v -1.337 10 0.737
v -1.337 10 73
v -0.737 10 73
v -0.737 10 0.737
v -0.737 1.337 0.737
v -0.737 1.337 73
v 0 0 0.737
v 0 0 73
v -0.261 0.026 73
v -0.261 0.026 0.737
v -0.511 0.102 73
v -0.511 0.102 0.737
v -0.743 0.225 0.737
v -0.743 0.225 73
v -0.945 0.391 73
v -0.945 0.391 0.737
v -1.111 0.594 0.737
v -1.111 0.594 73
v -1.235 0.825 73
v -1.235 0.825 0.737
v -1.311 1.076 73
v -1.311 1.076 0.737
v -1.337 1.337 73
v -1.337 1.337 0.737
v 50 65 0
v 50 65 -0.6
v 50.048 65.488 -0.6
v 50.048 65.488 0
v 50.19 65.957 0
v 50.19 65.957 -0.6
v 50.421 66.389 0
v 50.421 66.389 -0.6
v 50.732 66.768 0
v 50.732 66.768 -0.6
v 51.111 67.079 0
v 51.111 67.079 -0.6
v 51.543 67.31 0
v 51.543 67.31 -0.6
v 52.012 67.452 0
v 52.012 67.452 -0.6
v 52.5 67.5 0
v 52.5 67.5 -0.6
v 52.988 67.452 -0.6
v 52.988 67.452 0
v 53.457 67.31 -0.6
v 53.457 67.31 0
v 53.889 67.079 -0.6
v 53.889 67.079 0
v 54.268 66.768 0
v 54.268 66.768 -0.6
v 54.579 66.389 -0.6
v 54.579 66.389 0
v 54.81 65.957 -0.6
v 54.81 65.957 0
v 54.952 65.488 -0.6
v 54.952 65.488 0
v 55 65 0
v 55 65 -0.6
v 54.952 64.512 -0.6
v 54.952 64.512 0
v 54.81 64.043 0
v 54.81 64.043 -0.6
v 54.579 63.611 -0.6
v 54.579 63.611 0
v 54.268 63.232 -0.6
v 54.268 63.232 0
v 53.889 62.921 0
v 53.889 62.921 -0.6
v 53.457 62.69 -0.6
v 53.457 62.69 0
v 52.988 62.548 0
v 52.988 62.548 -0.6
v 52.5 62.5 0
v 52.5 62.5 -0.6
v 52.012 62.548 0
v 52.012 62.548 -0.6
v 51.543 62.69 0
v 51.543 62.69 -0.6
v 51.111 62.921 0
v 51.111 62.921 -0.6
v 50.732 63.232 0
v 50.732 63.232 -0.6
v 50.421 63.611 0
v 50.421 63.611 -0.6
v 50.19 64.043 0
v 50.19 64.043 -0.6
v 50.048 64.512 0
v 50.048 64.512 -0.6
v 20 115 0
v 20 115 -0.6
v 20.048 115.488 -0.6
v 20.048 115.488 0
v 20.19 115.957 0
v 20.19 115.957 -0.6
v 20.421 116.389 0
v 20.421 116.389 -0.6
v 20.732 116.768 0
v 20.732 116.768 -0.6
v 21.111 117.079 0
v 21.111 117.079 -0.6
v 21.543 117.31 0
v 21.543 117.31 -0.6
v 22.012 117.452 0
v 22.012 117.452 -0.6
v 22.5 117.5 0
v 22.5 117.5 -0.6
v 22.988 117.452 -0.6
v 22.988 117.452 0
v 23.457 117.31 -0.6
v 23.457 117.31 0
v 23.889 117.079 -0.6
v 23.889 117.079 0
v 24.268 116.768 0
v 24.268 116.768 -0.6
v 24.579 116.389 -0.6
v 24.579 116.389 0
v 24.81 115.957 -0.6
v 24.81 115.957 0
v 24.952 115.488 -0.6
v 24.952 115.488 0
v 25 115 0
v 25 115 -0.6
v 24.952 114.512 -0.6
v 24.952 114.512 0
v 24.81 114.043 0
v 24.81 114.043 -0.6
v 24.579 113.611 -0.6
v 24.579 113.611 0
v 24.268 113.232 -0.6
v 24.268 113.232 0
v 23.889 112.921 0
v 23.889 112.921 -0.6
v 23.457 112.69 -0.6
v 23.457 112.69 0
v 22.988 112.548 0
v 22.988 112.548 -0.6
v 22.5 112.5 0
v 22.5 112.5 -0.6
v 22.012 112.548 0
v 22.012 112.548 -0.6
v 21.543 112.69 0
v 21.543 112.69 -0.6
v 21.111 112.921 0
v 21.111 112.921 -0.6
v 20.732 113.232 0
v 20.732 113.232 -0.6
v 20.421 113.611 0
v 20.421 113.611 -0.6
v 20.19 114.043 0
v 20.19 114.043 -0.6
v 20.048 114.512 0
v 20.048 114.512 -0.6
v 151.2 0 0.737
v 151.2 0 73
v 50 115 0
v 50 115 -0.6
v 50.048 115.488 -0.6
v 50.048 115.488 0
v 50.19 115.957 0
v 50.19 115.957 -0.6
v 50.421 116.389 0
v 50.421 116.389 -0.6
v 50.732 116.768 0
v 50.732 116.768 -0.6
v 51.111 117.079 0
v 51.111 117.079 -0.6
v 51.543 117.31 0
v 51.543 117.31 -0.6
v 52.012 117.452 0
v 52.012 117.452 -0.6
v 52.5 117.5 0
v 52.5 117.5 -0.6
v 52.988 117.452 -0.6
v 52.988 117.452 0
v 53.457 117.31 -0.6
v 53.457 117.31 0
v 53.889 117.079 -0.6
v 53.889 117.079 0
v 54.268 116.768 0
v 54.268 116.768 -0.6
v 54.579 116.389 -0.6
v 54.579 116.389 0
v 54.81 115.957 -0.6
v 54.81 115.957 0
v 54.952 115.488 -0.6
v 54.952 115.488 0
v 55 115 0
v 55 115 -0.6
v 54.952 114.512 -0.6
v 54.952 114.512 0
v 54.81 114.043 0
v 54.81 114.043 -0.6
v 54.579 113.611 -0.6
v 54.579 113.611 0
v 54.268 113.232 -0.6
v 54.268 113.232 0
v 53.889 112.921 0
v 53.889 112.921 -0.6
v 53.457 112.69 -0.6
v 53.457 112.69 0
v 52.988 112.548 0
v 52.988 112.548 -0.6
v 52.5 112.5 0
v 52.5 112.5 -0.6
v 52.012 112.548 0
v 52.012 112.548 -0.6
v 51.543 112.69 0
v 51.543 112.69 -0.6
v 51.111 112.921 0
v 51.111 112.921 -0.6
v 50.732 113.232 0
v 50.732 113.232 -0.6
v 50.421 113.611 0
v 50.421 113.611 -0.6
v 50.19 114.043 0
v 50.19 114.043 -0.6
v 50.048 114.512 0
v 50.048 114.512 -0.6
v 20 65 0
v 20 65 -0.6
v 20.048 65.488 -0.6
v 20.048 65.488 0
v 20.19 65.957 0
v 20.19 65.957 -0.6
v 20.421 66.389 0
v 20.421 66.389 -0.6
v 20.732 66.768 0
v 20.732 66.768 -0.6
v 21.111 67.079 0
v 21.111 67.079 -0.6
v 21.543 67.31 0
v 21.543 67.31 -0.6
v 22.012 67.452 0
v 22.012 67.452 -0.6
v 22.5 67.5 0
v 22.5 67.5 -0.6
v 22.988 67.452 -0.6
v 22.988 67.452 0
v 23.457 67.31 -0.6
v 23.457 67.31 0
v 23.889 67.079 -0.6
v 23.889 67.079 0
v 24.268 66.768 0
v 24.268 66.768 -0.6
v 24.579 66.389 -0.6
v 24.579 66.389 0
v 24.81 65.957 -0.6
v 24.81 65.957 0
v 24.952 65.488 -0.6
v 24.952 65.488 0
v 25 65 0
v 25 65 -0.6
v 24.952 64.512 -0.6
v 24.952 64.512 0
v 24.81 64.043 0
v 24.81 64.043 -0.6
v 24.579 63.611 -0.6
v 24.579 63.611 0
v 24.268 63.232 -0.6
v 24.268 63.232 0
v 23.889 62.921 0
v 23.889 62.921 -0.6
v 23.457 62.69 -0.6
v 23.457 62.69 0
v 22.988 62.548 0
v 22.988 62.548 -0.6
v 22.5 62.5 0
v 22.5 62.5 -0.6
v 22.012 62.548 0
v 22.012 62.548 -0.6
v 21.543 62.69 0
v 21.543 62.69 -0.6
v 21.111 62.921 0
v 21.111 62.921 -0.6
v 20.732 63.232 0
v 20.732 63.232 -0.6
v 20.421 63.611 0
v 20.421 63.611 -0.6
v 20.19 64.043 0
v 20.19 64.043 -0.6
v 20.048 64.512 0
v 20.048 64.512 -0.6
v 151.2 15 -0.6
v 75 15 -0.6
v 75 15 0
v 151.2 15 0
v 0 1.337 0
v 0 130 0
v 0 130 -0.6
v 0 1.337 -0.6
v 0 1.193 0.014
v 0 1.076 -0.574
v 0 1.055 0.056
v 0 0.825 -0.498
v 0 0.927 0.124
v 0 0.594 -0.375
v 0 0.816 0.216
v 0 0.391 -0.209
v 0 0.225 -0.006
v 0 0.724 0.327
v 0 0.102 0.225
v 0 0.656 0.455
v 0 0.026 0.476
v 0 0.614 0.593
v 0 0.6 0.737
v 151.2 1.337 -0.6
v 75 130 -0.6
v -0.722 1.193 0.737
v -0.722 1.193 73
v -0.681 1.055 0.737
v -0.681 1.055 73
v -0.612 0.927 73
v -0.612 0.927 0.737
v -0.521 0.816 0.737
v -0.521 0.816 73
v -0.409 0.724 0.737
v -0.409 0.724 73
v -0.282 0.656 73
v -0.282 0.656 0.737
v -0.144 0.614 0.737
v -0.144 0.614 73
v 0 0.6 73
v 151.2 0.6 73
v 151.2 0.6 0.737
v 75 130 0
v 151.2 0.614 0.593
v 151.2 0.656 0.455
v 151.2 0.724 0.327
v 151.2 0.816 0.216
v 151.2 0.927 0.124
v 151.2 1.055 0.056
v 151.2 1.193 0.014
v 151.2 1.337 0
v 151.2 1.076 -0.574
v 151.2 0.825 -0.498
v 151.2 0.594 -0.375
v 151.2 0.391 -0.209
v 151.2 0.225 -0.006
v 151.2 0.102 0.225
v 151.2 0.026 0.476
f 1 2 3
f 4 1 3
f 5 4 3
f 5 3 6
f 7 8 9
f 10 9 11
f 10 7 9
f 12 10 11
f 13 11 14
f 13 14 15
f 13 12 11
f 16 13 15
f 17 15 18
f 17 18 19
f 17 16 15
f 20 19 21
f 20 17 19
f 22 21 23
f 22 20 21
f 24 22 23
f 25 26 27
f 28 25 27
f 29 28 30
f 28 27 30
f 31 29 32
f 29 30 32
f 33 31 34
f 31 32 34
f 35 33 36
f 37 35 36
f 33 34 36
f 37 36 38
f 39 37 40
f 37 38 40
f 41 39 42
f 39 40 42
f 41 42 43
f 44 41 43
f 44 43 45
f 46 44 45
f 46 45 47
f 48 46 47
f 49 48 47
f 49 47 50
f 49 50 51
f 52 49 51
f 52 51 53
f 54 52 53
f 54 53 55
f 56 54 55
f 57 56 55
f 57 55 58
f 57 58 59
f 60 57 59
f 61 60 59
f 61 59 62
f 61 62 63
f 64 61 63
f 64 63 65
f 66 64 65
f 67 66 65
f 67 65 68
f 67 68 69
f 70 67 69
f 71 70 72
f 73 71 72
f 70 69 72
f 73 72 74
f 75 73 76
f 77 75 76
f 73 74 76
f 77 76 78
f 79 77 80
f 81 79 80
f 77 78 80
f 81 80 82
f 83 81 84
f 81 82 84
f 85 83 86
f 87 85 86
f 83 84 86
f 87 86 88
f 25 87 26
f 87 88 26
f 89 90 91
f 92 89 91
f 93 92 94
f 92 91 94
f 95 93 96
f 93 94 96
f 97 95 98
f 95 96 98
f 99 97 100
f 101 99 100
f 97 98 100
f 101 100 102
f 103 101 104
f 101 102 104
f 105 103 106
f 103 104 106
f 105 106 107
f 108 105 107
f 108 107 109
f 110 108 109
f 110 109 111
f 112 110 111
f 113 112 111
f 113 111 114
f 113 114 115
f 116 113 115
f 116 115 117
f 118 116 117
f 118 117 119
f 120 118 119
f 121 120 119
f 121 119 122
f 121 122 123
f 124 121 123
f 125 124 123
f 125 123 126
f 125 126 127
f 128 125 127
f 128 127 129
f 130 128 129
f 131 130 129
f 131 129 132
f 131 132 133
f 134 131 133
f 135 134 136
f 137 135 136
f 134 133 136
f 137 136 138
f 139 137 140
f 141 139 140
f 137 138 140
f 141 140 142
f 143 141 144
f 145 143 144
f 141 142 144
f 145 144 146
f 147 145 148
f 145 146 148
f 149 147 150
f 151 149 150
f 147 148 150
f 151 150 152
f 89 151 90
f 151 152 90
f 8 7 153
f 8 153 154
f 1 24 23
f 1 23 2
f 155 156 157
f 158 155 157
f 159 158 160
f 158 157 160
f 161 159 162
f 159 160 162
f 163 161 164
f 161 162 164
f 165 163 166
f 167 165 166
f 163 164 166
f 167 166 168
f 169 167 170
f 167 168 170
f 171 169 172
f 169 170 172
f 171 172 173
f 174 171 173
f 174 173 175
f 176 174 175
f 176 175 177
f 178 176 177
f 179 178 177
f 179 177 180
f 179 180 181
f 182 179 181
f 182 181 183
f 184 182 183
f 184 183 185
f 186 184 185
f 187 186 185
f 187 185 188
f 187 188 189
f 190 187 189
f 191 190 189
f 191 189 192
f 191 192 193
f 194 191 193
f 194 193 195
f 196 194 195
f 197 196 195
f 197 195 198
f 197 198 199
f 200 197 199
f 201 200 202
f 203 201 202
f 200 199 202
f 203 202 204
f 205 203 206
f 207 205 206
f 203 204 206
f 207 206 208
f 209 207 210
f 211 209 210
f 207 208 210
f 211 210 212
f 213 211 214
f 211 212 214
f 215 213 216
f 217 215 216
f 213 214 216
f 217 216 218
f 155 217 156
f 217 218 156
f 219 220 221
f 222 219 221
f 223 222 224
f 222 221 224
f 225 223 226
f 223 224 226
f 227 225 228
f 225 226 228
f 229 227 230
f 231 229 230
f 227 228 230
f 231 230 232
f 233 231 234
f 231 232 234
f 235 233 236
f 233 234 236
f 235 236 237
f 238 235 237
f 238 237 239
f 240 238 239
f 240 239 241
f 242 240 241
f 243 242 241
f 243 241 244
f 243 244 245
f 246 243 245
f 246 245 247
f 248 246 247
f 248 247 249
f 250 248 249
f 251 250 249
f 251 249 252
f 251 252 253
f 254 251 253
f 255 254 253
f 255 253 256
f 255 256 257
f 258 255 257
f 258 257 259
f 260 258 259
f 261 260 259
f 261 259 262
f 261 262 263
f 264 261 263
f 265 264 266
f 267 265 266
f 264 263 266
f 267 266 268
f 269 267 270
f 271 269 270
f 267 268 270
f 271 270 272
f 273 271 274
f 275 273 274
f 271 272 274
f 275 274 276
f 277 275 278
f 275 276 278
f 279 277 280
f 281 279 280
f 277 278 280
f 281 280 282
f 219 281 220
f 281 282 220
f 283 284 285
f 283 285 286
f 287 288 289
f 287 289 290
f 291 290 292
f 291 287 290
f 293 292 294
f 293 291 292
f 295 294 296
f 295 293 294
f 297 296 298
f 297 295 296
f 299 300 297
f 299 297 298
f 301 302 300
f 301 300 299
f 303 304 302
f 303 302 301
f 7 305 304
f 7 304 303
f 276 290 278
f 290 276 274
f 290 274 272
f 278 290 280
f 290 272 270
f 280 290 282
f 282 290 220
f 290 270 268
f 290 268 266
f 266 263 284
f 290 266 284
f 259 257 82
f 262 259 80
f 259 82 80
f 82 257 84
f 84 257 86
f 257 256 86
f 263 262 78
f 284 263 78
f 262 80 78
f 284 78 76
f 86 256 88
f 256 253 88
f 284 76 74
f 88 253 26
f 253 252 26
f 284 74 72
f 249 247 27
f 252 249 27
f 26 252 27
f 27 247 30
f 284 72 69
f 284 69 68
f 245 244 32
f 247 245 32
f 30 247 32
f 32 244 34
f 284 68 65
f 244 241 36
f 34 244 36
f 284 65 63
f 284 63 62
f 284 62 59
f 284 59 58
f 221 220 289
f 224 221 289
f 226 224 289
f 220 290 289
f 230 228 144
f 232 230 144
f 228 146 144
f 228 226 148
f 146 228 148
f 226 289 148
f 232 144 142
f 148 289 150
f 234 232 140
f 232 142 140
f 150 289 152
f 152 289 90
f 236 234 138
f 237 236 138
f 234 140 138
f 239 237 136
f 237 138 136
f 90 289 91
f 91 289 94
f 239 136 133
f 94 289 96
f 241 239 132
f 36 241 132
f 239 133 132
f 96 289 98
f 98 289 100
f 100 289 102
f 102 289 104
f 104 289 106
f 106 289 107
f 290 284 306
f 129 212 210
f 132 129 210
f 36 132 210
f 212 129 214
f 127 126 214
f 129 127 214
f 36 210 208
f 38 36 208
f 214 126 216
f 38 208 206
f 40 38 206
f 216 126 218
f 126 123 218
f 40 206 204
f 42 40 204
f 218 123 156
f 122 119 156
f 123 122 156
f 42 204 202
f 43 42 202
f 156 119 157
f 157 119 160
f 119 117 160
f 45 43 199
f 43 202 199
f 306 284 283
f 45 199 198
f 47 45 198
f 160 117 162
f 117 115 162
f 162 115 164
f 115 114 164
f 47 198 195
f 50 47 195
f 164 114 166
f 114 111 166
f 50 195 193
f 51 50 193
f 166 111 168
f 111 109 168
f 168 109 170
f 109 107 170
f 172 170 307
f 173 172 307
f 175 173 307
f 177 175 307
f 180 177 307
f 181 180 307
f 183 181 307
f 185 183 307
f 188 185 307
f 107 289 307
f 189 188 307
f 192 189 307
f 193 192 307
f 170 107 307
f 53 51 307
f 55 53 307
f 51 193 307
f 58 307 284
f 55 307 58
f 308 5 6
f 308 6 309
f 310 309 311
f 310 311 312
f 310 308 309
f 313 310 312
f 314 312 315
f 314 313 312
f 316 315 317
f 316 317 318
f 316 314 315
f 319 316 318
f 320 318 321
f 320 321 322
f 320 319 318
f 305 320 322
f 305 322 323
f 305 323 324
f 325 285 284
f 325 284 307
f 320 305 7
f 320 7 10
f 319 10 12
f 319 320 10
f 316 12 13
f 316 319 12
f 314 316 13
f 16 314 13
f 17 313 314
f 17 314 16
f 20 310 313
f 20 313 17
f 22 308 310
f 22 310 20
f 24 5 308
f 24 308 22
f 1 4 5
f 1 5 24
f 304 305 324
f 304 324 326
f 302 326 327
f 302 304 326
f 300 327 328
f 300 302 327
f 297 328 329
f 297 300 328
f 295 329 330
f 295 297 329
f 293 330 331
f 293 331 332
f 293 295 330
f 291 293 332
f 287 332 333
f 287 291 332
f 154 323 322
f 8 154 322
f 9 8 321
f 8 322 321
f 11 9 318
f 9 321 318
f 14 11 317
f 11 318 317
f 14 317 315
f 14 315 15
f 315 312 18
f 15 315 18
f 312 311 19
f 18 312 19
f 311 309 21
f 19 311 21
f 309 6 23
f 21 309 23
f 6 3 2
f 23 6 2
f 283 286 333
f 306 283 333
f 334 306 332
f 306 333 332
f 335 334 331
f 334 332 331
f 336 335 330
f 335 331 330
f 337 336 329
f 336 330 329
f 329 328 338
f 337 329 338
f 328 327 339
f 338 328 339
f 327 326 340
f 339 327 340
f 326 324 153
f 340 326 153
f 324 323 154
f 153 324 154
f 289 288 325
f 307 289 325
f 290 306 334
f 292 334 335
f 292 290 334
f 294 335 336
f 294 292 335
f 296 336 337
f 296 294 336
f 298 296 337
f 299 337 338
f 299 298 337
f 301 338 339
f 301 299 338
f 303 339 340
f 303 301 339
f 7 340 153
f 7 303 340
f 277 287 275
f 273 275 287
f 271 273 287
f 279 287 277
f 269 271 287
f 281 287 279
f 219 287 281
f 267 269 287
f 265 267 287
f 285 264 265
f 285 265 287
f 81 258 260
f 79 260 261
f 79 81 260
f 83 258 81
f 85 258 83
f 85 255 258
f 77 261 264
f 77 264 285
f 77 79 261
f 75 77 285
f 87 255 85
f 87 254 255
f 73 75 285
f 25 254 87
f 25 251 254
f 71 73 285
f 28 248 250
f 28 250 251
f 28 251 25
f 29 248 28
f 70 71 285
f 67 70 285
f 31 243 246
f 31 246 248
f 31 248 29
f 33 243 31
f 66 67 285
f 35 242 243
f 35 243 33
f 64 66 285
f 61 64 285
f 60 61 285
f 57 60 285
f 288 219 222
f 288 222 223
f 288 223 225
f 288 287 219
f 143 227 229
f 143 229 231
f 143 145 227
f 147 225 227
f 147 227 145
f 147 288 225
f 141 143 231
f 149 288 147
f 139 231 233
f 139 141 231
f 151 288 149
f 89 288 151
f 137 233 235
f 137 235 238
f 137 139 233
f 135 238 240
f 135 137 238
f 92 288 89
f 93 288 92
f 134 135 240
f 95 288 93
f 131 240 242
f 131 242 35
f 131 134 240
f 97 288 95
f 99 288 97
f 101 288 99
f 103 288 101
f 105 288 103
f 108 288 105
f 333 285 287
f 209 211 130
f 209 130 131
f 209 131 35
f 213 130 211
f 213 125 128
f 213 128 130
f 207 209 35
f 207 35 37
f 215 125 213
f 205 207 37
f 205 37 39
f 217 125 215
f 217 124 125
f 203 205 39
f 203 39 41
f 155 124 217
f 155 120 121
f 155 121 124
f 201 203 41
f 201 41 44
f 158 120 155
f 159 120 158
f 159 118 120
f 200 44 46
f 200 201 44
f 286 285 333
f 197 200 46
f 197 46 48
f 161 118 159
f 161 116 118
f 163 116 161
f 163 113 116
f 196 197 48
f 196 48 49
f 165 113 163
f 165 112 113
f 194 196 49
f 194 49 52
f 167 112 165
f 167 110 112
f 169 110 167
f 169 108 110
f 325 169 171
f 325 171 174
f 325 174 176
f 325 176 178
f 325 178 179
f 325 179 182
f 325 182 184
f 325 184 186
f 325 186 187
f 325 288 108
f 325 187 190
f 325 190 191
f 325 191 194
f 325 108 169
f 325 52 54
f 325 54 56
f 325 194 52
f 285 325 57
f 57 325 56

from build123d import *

# Parameters (mm, degrees)
SKETCH2_W                    = 75
SKETCH2_H                    = 130
BASE_FLANGE1_DEPTH           = 0.6
TAB2_START                   = -0.6
TAB2_OUTLINE_W               = 76.2
TAB2_OUTLINE_H               = 15
TAB2_DEPTH                   = 0.6
CUT_EXTRUDE1_REACH           = 201.404
SKETCH10_R                   = 2.5
EDGE_FLANGE1_STRIP_W         = 3.8732
EDGE_FLANGE1_STRIP_H         = 0.6
EDGE_FLANGE1_STRIP_CUT_DEPTH = 151.2
EDGE_FLANGE1_DEPTH           = 151.2
EDGE_FLANGE2_DEPTH           = 72.2634


# Read off the part's stored shape, not the designer's step: Tab2
# Sheet-metal steps are written as plain solids
with BuildPart() as part:
    # Sketch2 → Base-Flange1 (new body)
    with BuildSketch(Plane.XY):
        with Locations((37.5, 65)):
            Rectangle(SKETCH2_W, SKETCH2_H)
    extrude(amount=-BASE_FLANGE1_DEPTH)

    # Tab2 outline → Tab2 (add)
    with BuildSketch(Plane.XY.offset(TAB2_START)):
        with Locations((113.1, 7.5)):
            Rectangle(TAB2_OUTLINE_W, TAB2_OUTLINE_H)
    extrude(amount=TAB2_DEPTH)

    # Sketch10 → Cut-Extrude1 (cut, up to next)
    with BuildSketch(Plane(origin=(0, 0, -0.6), x_dir=(-1, 0, 0), z_dir=(0, 0, -1)), mode=Mode.PRIVATE) as cut_extrude1_sk1:
        with Locations((-22.5, 65)):
            Circle(SKETCH10_R)
    cut_extrude1_tool1 = extrude(cut_extrude1_sk1.sketch, amount=-CUT_EXTRUDE1_REACH, mode=Mode.PRIVATE) & part.part
    # Sketch10 → Cut-Extrude1 (cut, up to next)
    with BuildSketch(Plane(origin=(0, 0, -0.6), x_dir=(-1, 0, 0), z_dir=(0, 0, -1)), mode=Mode.PRIVATE) as cut_extrude1_sk2:
        with Locations((-52.5, 115)):
            Circle(SKETCH10_R)
    cut_extrude1_tool2 = extrude(cut_extrude1_sk2.sketch, amount=-CUT_EXTRUDE1_REACH, mode=Mode.PRIVATE) & part.part
    # Sketch10 → Cut-Extrude1 (cut, up to next)
    with BuildSketch(Plane(origin=(0, 0, -0.6), x_dir=(-1, 0, 0), z_dir=(0, 0, -1)), mode=Mode.PRIVATE) as cut_extrude1_sk3:
        with Locations((-52.5, 65)):
            Circle(SKETCH10_R)
    cut_extrude1_tool3 = extrude(cut_extrude1_sk3.sketch, amount=-CUT_EXTRUDE1_REACH, mode=Mode.PRIVATE) & part.part
    # Sketch10 → Cut-Extrude1 (cut, up to next)
    with BuildSketch(Plane(origin=(0, 0, -0.6), x_dir=(-1, 0, 0), z_dir=(0, 0, -1)), mode=Mode.PRIVATE) as cut_extrude1_sk4:
        with Locations((-22.5, 115)):
            Circle(SKETCH10_R)
    cut_extrude1_tool4 = extrude(cut_extrude1_sk4.sketch, amount=-CUT_EXTRUDE1_REACH, mode=Mode.PRIVATE) & part.part
    add(cut_extrude1_tool1.solids().sort_by_distance((22.5, 65, -0.6))[0], mode=Mode.SUBTRACT)
    add(cut_extrude1_tool2.solids().sort_by_distance((52.5, 115, -0.6))[0], mode=Mode.SUBTRACT)
    add(cut_extrude1_tool3.solids().sort_by_distance((52.5, 65, -0.6))[0], mode=Mode.SUBTRACT)
    add(cut_extrude1_tool4.solids().sort_by_distance((22.5, 115, -0.6))[0], mode=Mode.SUBTRACT)

    # Edge-Flange1 strip (across the edge) → Edge-Flange1 strip cut (cut)
    with BuildSketch(Plane.YZ):
        with Locations((-0.6, -0.3)):
            Rectangle(EDGE_FLANGE1_STRIP_W, EDGE_FLANGE1_STRIP_H)
    extrude(amount=EDGE_FLANGE1_STRIP_CUT_DEPTH, mode=Mode.SUBTRACT)

    # Edge-Flange1 section (across the edge) → Edge-Flange1 (add)
    with BuildSketch(Plane.YZ):
        with BuildLine():
            Line((0, 0.7366), (0, 73))
            Line((0, 73), (0.6, 73))
            Line((0.6, 73), (0.6, 0.7366))
            ThreePointArc((0.6, 0.7366), (0.815745145, 0.215745145), (1.3366, 0))
            Line((1.3366, 0), (1.3366, -0.6))
            ThreePointArc((1.3366, -0.6), (0.391481076, -0.208518924), (0, 0.7366))
        make_face()
    extrude(amount=EDGE_FLANGE1_DEPTH)

    # Edge-Flange2 section (across the edge) → Edge-Flange2 (add)
    with BuildSketch(Plane(origin=(-0.7366, 0.6, 0.7366), x_dir=(1, 0, 0), z_dir=(0, 0, 1))):
        with BuildLine():
            Line((-0.6, 0.7366), (-0.6, 9.4))
            Line((-0.6, 9.4), (0, 9.4))
            Line((0, 9.4), (0, 0.7366))
            ThreePointArc((0, 0.7366), (0.215745145, 0.215745145), (0.7366, 0))
            Line((0.7366, 0), (0.7366, -0.6))
            ThreePointArc((0.7366, -0.6), (-0.208518924, -0.208518924), (-0.6, 0.7366))
        make_face()
    extrude(amount=EDGE_FLANGE2_DEPTH)


solid = part.part
